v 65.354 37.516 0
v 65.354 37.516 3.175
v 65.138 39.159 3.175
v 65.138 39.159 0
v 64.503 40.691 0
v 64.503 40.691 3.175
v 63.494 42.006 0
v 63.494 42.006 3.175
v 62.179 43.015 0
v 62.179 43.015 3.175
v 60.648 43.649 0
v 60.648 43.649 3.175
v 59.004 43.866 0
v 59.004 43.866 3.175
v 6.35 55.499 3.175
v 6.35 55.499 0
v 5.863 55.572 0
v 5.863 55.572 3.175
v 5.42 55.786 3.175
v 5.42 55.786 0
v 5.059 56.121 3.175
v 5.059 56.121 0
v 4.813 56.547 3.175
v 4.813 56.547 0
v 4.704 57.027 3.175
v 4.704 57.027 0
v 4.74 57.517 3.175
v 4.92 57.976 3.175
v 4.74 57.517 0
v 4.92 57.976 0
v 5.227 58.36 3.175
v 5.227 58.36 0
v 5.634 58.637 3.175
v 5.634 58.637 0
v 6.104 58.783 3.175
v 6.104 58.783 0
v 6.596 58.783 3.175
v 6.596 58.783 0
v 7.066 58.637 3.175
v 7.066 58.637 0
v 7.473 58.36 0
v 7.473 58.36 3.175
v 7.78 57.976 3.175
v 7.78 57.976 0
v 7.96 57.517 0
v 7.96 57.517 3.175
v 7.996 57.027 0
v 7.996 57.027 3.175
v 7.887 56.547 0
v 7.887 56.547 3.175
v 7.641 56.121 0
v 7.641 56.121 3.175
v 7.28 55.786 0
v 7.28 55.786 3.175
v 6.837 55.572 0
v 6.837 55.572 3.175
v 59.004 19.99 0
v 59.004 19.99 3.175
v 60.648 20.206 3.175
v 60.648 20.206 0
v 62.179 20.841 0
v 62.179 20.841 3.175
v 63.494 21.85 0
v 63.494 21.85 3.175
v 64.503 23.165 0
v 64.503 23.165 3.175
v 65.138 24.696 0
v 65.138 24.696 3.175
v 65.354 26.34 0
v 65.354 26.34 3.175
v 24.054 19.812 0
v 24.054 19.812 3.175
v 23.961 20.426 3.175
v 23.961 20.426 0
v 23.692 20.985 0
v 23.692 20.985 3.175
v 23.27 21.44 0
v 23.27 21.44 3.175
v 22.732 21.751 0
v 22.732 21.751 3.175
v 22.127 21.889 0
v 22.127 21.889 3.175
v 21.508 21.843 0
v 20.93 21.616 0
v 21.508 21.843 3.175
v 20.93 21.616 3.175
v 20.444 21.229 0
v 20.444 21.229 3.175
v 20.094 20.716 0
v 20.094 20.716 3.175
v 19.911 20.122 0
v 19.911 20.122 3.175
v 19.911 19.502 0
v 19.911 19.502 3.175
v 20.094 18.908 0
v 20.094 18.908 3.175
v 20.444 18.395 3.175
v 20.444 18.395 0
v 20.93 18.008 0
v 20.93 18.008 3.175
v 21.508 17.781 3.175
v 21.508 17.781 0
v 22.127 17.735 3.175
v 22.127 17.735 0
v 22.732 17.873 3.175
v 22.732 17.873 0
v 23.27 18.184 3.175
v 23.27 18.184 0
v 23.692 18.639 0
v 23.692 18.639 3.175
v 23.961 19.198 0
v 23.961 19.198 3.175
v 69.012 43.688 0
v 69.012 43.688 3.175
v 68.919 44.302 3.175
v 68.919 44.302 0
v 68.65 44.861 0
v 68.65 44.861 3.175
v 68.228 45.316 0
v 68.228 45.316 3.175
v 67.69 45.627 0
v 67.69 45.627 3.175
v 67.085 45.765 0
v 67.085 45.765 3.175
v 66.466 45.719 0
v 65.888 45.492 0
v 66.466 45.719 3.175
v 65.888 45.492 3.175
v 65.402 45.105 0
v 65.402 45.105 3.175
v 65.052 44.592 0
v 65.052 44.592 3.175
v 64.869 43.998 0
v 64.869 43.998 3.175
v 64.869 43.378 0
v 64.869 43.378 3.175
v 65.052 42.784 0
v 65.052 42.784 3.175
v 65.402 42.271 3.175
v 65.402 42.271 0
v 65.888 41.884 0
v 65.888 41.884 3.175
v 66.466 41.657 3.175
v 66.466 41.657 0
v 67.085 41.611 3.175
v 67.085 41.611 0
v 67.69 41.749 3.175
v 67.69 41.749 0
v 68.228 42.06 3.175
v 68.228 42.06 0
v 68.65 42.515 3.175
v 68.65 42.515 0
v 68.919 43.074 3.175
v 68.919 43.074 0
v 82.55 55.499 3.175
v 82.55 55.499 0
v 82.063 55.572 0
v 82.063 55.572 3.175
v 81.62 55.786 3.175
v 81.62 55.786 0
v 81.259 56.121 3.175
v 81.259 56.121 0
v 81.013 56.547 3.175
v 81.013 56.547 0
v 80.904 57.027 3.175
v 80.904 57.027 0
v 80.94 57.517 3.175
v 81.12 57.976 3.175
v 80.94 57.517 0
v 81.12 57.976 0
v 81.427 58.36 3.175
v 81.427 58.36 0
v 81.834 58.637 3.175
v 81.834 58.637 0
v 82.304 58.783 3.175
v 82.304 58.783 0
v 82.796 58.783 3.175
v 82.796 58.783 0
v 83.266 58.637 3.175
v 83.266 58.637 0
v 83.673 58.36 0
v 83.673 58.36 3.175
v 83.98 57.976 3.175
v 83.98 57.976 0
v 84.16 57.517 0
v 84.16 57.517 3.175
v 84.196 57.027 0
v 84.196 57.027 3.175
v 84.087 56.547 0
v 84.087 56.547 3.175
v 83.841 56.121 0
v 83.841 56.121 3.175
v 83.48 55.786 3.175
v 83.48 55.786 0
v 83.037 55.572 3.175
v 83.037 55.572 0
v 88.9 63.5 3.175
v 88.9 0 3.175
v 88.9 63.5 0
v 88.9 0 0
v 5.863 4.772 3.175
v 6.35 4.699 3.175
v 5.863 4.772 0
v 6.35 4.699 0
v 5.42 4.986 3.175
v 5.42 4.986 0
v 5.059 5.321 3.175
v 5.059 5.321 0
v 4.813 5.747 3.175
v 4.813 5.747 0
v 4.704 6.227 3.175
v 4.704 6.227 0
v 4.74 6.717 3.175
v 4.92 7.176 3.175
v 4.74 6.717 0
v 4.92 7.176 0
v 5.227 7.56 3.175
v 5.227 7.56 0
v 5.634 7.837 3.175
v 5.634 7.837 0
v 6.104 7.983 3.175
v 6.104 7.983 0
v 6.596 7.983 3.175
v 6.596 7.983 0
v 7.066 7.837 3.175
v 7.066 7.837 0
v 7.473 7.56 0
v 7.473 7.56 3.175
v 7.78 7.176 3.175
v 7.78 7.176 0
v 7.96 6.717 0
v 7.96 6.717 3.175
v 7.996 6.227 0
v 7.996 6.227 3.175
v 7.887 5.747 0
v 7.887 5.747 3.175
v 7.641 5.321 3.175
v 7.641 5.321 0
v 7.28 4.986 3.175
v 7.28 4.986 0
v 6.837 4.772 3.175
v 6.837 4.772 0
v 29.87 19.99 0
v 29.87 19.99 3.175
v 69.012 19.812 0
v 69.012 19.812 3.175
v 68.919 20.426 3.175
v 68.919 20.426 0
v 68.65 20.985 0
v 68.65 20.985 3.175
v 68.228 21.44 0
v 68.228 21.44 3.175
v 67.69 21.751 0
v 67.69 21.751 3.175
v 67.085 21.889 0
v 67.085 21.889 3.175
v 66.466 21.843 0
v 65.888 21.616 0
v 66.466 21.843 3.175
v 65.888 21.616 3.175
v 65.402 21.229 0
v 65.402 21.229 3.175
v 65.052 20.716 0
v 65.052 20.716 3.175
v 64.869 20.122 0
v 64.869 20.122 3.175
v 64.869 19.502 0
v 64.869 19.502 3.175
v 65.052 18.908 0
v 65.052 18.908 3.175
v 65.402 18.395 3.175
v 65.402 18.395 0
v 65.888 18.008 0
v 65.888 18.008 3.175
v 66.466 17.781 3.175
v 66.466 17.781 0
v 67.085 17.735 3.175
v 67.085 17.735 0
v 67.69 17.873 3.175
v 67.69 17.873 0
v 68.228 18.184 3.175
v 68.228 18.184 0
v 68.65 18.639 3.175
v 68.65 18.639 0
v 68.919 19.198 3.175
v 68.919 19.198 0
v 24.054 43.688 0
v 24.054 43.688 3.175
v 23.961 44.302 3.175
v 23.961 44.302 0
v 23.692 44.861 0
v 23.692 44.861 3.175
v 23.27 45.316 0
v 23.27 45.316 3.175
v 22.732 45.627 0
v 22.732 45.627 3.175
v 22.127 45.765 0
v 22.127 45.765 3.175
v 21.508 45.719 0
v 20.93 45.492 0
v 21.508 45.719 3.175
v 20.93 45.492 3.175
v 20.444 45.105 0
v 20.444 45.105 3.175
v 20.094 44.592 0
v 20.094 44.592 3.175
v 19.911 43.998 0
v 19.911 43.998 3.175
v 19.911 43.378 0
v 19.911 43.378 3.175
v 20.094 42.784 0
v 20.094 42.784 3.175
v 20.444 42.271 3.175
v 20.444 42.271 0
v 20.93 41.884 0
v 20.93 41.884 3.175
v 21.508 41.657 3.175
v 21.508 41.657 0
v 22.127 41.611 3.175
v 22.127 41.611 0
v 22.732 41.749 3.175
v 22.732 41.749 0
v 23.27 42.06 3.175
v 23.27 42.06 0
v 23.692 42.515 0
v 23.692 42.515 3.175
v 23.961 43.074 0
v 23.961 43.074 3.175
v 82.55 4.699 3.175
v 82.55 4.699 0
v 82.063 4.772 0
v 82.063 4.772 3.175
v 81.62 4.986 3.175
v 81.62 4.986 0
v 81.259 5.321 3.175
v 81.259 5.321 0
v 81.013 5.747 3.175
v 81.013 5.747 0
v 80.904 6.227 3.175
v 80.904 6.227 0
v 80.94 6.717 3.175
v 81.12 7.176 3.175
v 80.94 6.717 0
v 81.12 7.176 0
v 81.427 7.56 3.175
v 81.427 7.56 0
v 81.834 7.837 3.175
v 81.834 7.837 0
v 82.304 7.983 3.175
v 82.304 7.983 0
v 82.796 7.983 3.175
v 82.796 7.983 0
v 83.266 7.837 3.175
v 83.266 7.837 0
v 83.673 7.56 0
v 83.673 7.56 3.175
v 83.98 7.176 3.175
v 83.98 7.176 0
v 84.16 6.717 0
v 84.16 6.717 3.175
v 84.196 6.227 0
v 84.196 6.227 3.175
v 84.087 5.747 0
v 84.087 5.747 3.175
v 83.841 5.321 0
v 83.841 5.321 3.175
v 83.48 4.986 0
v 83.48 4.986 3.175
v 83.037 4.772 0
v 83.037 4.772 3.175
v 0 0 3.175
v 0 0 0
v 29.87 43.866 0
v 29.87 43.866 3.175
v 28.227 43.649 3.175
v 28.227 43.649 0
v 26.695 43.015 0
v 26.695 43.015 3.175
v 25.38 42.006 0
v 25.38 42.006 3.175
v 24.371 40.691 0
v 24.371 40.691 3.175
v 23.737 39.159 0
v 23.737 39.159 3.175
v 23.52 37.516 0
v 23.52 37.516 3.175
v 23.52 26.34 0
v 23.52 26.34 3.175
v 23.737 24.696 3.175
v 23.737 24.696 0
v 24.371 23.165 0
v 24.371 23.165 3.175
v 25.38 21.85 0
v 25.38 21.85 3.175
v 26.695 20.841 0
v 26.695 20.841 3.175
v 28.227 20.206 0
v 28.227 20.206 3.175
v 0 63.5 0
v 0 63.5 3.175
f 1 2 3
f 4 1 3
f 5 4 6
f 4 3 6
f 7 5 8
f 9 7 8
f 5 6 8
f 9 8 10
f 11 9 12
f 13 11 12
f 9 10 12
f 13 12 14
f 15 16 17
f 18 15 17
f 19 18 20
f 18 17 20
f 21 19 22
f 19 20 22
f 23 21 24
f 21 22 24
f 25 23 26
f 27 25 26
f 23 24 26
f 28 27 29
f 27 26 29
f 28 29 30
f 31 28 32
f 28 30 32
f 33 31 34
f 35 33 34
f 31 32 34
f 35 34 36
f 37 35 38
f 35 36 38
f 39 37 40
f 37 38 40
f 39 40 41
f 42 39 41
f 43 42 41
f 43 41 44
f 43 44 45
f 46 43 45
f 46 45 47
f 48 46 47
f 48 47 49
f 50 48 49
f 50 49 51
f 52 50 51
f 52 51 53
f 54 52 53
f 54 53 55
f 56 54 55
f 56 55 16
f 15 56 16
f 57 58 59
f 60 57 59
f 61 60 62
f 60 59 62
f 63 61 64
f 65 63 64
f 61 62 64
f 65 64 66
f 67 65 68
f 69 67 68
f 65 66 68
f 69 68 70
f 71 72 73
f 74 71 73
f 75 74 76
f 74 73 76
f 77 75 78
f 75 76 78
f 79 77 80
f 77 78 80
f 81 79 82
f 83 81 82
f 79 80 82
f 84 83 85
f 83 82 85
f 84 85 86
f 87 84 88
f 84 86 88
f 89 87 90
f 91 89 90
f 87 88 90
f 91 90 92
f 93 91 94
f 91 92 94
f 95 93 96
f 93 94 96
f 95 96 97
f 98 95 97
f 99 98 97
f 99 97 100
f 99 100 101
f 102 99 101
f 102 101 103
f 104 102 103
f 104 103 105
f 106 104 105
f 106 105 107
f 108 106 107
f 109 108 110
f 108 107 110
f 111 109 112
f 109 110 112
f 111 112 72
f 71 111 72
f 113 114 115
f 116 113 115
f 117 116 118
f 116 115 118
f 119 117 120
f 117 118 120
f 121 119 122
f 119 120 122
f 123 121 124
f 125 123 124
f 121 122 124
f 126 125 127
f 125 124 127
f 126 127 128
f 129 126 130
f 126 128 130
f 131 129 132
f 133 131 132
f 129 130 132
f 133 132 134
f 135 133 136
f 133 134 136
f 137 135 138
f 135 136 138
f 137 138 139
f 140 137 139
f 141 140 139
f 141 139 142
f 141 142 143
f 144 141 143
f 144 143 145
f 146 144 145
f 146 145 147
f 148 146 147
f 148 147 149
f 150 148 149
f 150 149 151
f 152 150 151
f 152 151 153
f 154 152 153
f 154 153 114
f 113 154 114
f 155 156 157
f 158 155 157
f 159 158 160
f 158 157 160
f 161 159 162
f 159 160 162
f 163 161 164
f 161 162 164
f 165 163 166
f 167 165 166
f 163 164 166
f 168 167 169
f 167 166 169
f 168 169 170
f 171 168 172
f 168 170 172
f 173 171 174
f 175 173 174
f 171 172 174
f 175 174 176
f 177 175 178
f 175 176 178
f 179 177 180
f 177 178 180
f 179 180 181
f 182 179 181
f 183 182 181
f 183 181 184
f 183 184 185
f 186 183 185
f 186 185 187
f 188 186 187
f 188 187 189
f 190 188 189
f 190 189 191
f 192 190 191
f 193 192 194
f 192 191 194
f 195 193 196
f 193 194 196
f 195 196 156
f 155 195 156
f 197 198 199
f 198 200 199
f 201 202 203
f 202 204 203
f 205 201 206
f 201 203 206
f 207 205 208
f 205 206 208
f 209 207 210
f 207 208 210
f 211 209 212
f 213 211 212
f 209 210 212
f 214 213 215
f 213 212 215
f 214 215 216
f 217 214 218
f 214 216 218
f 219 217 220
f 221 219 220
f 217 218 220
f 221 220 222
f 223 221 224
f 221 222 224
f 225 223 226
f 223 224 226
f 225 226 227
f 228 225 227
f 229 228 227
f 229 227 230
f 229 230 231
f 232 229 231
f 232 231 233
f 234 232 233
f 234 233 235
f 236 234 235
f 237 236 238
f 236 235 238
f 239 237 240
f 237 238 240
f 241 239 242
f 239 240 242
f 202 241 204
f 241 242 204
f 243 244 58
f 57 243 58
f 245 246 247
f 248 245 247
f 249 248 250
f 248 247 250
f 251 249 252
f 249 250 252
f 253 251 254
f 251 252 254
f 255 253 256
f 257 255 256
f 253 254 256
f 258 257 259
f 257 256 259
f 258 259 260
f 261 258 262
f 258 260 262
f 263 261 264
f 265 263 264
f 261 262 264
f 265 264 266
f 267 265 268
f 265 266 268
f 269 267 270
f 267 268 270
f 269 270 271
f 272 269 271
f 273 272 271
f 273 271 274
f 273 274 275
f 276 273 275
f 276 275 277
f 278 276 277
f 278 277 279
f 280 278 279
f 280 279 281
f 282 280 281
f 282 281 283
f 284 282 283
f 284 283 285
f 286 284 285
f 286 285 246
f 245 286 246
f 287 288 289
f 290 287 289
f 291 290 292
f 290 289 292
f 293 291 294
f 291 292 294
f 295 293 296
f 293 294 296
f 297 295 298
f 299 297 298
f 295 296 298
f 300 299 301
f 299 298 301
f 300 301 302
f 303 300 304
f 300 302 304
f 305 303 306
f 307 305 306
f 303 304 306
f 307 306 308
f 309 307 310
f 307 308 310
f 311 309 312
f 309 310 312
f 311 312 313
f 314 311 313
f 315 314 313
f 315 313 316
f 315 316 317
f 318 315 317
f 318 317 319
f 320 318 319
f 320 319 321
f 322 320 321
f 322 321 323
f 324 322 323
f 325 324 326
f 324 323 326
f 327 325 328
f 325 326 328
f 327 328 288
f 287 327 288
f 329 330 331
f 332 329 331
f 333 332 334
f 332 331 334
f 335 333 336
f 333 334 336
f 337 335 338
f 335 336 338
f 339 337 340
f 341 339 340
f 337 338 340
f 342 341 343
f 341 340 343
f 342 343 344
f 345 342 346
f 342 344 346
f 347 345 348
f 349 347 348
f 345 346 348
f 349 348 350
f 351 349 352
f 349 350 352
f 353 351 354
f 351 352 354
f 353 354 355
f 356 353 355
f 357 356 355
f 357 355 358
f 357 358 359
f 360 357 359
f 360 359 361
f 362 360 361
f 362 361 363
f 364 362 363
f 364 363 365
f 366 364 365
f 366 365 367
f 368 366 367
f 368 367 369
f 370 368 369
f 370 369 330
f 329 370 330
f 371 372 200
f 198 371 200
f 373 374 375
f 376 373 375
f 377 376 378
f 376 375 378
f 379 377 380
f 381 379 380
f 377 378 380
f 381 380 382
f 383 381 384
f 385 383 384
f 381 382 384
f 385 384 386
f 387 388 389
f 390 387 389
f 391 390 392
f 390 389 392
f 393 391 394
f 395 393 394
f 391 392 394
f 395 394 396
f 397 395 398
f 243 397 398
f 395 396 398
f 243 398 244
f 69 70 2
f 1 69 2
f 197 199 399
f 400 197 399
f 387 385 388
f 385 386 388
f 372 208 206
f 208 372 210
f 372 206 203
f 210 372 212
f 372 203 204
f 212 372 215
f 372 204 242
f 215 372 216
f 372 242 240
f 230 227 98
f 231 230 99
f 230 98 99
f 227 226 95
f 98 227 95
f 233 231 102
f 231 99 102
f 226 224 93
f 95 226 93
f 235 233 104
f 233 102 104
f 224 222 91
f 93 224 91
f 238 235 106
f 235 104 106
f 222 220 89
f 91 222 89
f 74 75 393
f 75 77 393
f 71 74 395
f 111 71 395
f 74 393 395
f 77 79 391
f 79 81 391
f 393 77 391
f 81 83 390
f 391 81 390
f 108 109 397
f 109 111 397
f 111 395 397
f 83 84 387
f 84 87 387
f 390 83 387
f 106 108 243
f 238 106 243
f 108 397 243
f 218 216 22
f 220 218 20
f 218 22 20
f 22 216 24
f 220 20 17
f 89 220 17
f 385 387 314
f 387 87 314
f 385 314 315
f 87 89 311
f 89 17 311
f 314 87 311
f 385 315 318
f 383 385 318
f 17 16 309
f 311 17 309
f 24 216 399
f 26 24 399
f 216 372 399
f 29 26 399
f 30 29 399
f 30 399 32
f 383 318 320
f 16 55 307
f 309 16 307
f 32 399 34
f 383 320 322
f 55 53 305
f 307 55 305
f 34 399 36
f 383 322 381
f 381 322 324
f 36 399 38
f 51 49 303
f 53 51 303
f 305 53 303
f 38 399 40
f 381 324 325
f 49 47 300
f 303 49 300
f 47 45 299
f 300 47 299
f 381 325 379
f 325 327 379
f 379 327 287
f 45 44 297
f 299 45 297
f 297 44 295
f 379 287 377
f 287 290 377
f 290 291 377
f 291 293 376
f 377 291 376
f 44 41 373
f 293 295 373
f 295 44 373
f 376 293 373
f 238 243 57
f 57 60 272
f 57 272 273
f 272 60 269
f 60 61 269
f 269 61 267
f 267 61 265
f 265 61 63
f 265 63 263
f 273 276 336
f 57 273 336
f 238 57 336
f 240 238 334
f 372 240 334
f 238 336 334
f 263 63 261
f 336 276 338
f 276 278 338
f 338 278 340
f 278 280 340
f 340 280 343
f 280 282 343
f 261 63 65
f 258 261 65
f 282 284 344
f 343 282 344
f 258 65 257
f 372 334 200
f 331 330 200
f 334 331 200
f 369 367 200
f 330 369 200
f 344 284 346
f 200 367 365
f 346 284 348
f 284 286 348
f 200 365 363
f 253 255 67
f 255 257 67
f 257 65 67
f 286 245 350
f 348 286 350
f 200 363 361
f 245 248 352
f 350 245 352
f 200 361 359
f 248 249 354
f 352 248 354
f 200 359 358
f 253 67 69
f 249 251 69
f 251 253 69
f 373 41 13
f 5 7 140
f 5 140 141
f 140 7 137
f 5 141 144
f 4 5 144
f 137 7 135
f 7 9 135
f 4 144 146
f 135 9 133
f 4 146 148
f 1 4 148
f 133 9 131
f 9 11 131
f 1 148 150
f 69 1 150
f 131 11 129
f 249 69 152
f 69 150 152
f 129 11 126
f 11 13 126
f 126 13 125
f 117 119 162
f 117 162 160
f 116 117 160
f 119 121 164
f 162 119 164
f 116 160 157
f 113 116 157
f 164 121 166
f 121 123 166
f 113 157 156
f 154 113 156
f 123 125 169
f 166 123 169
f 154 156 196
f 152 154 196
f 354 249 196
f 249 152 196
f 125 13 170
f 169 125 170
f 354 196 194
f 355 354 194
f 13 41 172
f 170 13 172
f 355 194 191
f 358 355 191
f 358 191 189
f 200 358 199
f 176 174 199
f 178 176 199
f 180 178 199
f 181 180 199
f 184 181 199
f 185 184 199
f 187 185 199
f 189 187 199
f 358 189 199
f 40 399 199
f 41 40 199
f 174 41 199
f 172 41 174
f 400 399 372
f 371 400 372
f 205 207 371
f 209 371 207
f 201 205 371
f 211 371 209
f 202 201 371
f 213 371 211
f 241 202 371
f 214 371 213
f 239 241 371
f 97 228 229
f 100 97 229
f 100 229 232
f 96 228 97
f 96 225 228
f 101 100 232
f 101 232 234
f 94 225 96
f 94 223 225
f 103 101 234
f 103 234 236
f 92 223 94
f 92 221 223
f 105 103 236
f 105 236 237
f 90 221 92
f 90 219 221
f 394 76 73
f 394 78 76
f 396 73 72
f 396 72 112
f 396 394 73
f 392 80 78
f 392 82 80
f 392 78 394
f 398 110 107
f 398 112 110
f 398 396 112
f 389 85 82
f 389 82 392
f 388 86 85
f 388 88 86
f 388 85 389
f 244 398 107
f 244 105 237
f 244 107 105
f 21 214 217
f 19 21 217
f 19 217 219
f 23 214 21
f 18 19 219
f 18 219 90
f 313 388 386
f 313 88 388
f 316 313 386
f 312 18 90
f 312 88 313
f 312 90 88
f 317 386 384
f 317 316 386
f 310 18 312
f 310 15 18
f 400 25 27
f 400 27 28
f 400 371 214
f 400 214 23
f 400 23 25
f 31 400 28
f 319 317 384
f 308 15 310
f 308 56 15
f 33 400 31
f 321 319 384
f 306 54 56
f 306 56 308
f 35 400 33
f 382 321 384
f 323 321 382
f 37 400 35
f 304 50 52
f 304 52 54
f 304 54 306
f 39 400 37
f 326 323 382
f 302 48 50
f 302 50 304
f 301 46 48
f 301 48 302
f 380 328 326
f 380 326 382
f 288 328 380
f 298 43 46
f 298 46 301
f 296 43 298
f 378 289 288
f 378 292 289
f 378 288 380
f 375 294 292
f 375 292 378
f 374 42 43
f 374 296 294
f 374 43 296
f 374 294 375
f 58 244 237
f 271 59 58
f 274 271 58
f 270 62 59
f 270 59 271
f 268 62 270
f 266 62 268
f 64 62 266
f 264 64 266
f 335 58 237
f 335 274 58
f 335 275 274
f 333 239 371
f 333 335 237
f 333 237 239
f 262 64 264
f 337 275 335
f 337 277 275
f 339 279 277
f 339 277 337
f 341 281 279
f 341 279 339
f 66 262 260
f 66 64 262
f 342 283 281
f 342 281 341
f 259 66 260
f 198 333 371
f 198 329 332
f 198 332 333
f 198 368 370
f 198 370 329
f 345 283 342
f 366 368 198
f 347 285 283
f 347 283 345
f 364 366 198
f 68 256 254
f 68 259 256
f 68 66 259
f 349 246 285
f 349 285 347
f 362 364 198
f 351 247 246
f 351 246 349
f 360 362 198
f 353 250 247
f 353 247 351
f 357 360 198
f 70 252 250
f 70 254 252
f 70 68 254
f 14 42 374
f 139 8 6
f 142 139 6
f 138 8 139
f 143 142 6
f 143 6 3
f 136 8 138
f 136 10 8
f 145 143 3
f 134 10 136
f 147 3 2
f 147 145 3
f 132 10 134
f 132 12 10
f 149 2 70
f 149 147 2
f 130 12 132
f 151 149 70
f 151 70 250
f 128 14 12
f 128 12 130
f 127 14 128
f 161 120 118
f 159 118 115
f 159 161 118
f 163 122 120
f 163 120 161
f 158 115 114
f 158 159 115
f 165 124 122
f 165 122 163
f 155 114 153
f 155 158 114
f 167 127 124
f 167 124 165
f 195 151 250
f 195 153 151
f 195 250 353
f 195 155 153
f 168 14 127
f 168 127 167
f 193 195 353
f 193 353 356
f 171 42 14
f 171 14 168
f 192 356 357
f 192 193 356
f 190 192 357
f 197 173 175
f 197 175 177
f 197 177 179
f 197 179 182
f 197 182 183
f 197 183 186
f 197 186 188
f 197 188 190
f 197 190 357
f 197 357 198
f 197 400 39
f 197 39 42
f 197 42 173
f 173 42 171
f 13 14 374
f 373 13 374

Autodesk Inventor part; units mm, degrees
ref_plane "YZ Plane" through (0, 0, 0) normal (1, 0, 0) x (0, 1, 0)
ref_plane "XZ Plane" through (0, 0, 0) normal (0, 1, 0) x (-1, 0, 0)
ref_plane "XY Plane" through (0, 0, 0) normal (0, 0, 1) x (1, 0, 0)
sketch "Sketch1" plane through (0, 0, 0) normal (0, 0, 1) x (1, 0, 0)
  line L0 (0, 0) -> (88.9, 0)
  line L1 (88.9, 0) -> (88.9, 63.5)
  line L2 (88.9, 63.5) -> (0, 63.5)
  line L3 (0, 63.5) -> (0, 0)
  dimension "d0" = 88.9
  dimension "d1" = 63.5
extrude "Extrusion1" add sketch "Sketch1" along normal blind 3.175
sketch "Sketch2" plane through (0, 0, 3.175) normal (0, 0, 1) x (1, 0, 0)
  line L0 (16.891, 13.97) -> (72.009, 13.97)
  line L1 (72.009, 13.97) -> (72.009, 49.53)
  line L2 (72.009, 49.53) -> (16.891, 49.53)
  line L3 (16.891, 49.53) -> (16.891, 13.97)
  circle A0 centre (21.971, 43.688) radius 2.0828
  circle A1 centre (66.929, 43.688) radius 2.0828
  circle A2 centre (66.929, 19.812) radius 2.0828
  circle A3 centre (21.971, 19.812) radius 2.0828
  line L4 (29.8704, 19.9898) -> (59.0042, 19.9898)
  line L5 (65.3542, 26.3398) -> (65.3542, 37.5158)
  line L6 (59.0042, 43.8658) -> (29.8704, 43.8658)
  line L7 (23.5204, 37.5158) -> (23.5204, 26.3398)
  arc A4 (29.8704, 43.8658) -> (23.5204, 37.5158) centre (29.8704, 37.5158) ccw
  arc A5 (23.5204, 26.3398) -> (29.8704, 19.9898) centre (29.8704, 26.3398) ccw
  arc A6 (59.0042, 19.9898) -> (65.3542, 26.3398) centre (59.0042, 26.3398) ccw
  arc A7 (65.3542, 37.5158) -> (59.0042, 43.8658) centre (59.0042, 37.5158) ccw
  line L8 (0, 63.5) -> (0, 0) projected
  line L9 (88.9, 0) -> (88.9, 63.5) projected
  line L10 (0, 0) -> (88.9, 0) projected
  line L11 (88.9, 63.5) -> (0, 63.5) projected
  point P0 (23.5204, 19.9898)
  point P1 (65.3542, 43.8658)
  point P2 (65.3542, 19.9898)
  dimension "d4" = 55.118
  dimension "d5" = 35.56
  dimension "d6" = 4.1656
  dimension "d7" = 5.08
  dimension "d8" = 5.842
  dimension "d9" = 5.842
  dimension "d10" = 5.842
  dimension "d11" = 5.842
  dimension "d12" = 5.08
  dimension "d13" = 5.08
  dimension "d14" = 5.08
  dimension "d15" = 23.876
  dimension "d16" = 41.8338
  dimension "d17" = 1.5748
  dimension "d18" = 0.1778
  dimension "d19" = 6.35
  dimension "d20" = 88.9
  dimension "d21" = 63.5
  dimension "d22" = 13.97
  dimension "d23" = 16.891
extrude "Extrusion2" cut sketch "Sketch2" against normal through all contours A0 | A1 | A2 | A3 | A5 L7 A4 L6 A7 L5 A6 L4
sketch "Sketch4" plane through (0, 0, 3.175) normal (0, 0, 1) x (1, 0, 0)
  line L0 (38.1, 57.15) -> (51.2683, 57.15) construction
  line L1 (51.2683, 57.15) -> (51.2683, 45.6081) construction
  line L2 (51.2683, 45.6081) -> (38.1, 45.6081) construction
  line L3 (38.1, 45.6081) -> (38.1, 57.15) construction
  line L4 (0, 63.5) -> (0, 0) projected
  line L5 (88.9, 63.5) -> (0, 63.5) projected
sketch "Sketch5" plane through (0, 0, 0) normal (0, 0, -1) x (-1, 0, 0)
  line L0 (-61.8811, 60.2648) -> (-25.8263, 60.2648) construction
  line L1 (-25.8263, 60.2648) -> (-25.8263, 56.54) construction
  line L2 (-25.8263, 56.54) -> (-61.8811, 56.54) construction
  line L3 (-61.8811, 56.54) -> (-61.8811, 60.2648) construction
  point P0 (0, 0)
sketch "Sketch6" plane through (0, 0, 3.175) normal (0, 0, 1) x (1, 0, 0)
  line L0 (0, 63.5) -> (0, 0) projected
  circle A0 centre (66.929, 43.688) radius 2.0828 projected
  circle A1 centre (21.971, 19.812) radius 2.0828 projected
  circle A2 centre (21.971, 43.688) radius 2.0828 projected
  circle A3 centre (66.929, 19.812) radius 2.0828 projected
  arc A4 (59.0042, 19.9898) -> (65.3542, 26.3398) centre (59.0042, 26.3398) ccw projected
  line L1 (59.0042, 19.9898) -> (29.8704, 19.9898) projected
  arc A5 (23.5204, 26.3398) -> (29.8704, 19.9898) centre (29.8704, 26.3398) ccw projected
  line L2 (23.5204, 26.3398) -> (23.5204, 37.5158) projected
  arc A6 (29.8704, 43.8658) -> (23.5204, 37.5158) centre (29.8704, 37.5158) ccw projected
  line L3 (29.8704, 43.8658) -> (59.0042, 43.8658) projected
  arc A7 (65.3542, 37.5158) -> (59.0042, 43.8658) centre (59.0042, 37.5158) ccw projected
  line L4 (65.3542, 37.5158) -> (65.3542, 26.3398) projected
  line L5 (0, 0) -> (88.9, 0) projected
  line L6 (88.9, 0) -> (88.9, 63.5) projected
  line L7 (88.9, 63.5) -> (0, 63.5) projected
  line L8 (0, 63.5) -> (0, 0) projected
  point P0 (6.35, 57.15)
  point P1 (82.55, 57.15)
  point P2 (82.55, 6.35)
  point P3 (6.35, 6.35)
  dimension "d57" = 6.35
  dimension "d58" = 6.35
  dimension "d59" = 6.35
  dimension "d60" = 6.35
  dimension "d61" = 6.35
  dimension "d62" = 6.35
  dimension "d63" = 6.35
  dimension "d64" = 6.35
hole "Hole1" at (6.35, 57.15, 3.175) at (6.35, 6.35, 3.175) at (82.55, 6.35, 3.175) at (82.55, 57.15, 3.175) direction (0, 0, -1) diameter 3.302 end through all
thread "Thread9" size "8-32 UNC" class "2B" standard "ANSI Unified Screw Threads" full length
thread "Thread10" size "8-32 UNC" class "2B" standard "ANSI Unified Screw Threads" full length
thread "Thread11" size "8-32 UNC" class "2B" standard "ANSI Unified Screw Threads" full length
thread "Thread12" size "8-32 UNC" class "2B" standard "ANSI Unified Screw Threads" full length
equation "\"d9\" = d8"
equation "\"d10\" = d9"
equation "\"d11\" = d8"
equation "\"d12\" = d7"
equation "\"d13\" = d7"
equation "\"d14\" = d7"
equation "\"d22\" = -0.5 * d5 + 0.5 * d21"
equation "\"d23\" = -0.5 * d4 + 0.5 * d20"
equation "\"d58\" = d57"
equation "\"d59\" = d58"
equation "\"d60\" = d59"
equation "\"d61\" = d59"
equation "\"d62\" = d61"
equation "\"d63\" = d58"
equation "\"d64\" = d63"
properties part number "LFEV2017_TSI_007"
